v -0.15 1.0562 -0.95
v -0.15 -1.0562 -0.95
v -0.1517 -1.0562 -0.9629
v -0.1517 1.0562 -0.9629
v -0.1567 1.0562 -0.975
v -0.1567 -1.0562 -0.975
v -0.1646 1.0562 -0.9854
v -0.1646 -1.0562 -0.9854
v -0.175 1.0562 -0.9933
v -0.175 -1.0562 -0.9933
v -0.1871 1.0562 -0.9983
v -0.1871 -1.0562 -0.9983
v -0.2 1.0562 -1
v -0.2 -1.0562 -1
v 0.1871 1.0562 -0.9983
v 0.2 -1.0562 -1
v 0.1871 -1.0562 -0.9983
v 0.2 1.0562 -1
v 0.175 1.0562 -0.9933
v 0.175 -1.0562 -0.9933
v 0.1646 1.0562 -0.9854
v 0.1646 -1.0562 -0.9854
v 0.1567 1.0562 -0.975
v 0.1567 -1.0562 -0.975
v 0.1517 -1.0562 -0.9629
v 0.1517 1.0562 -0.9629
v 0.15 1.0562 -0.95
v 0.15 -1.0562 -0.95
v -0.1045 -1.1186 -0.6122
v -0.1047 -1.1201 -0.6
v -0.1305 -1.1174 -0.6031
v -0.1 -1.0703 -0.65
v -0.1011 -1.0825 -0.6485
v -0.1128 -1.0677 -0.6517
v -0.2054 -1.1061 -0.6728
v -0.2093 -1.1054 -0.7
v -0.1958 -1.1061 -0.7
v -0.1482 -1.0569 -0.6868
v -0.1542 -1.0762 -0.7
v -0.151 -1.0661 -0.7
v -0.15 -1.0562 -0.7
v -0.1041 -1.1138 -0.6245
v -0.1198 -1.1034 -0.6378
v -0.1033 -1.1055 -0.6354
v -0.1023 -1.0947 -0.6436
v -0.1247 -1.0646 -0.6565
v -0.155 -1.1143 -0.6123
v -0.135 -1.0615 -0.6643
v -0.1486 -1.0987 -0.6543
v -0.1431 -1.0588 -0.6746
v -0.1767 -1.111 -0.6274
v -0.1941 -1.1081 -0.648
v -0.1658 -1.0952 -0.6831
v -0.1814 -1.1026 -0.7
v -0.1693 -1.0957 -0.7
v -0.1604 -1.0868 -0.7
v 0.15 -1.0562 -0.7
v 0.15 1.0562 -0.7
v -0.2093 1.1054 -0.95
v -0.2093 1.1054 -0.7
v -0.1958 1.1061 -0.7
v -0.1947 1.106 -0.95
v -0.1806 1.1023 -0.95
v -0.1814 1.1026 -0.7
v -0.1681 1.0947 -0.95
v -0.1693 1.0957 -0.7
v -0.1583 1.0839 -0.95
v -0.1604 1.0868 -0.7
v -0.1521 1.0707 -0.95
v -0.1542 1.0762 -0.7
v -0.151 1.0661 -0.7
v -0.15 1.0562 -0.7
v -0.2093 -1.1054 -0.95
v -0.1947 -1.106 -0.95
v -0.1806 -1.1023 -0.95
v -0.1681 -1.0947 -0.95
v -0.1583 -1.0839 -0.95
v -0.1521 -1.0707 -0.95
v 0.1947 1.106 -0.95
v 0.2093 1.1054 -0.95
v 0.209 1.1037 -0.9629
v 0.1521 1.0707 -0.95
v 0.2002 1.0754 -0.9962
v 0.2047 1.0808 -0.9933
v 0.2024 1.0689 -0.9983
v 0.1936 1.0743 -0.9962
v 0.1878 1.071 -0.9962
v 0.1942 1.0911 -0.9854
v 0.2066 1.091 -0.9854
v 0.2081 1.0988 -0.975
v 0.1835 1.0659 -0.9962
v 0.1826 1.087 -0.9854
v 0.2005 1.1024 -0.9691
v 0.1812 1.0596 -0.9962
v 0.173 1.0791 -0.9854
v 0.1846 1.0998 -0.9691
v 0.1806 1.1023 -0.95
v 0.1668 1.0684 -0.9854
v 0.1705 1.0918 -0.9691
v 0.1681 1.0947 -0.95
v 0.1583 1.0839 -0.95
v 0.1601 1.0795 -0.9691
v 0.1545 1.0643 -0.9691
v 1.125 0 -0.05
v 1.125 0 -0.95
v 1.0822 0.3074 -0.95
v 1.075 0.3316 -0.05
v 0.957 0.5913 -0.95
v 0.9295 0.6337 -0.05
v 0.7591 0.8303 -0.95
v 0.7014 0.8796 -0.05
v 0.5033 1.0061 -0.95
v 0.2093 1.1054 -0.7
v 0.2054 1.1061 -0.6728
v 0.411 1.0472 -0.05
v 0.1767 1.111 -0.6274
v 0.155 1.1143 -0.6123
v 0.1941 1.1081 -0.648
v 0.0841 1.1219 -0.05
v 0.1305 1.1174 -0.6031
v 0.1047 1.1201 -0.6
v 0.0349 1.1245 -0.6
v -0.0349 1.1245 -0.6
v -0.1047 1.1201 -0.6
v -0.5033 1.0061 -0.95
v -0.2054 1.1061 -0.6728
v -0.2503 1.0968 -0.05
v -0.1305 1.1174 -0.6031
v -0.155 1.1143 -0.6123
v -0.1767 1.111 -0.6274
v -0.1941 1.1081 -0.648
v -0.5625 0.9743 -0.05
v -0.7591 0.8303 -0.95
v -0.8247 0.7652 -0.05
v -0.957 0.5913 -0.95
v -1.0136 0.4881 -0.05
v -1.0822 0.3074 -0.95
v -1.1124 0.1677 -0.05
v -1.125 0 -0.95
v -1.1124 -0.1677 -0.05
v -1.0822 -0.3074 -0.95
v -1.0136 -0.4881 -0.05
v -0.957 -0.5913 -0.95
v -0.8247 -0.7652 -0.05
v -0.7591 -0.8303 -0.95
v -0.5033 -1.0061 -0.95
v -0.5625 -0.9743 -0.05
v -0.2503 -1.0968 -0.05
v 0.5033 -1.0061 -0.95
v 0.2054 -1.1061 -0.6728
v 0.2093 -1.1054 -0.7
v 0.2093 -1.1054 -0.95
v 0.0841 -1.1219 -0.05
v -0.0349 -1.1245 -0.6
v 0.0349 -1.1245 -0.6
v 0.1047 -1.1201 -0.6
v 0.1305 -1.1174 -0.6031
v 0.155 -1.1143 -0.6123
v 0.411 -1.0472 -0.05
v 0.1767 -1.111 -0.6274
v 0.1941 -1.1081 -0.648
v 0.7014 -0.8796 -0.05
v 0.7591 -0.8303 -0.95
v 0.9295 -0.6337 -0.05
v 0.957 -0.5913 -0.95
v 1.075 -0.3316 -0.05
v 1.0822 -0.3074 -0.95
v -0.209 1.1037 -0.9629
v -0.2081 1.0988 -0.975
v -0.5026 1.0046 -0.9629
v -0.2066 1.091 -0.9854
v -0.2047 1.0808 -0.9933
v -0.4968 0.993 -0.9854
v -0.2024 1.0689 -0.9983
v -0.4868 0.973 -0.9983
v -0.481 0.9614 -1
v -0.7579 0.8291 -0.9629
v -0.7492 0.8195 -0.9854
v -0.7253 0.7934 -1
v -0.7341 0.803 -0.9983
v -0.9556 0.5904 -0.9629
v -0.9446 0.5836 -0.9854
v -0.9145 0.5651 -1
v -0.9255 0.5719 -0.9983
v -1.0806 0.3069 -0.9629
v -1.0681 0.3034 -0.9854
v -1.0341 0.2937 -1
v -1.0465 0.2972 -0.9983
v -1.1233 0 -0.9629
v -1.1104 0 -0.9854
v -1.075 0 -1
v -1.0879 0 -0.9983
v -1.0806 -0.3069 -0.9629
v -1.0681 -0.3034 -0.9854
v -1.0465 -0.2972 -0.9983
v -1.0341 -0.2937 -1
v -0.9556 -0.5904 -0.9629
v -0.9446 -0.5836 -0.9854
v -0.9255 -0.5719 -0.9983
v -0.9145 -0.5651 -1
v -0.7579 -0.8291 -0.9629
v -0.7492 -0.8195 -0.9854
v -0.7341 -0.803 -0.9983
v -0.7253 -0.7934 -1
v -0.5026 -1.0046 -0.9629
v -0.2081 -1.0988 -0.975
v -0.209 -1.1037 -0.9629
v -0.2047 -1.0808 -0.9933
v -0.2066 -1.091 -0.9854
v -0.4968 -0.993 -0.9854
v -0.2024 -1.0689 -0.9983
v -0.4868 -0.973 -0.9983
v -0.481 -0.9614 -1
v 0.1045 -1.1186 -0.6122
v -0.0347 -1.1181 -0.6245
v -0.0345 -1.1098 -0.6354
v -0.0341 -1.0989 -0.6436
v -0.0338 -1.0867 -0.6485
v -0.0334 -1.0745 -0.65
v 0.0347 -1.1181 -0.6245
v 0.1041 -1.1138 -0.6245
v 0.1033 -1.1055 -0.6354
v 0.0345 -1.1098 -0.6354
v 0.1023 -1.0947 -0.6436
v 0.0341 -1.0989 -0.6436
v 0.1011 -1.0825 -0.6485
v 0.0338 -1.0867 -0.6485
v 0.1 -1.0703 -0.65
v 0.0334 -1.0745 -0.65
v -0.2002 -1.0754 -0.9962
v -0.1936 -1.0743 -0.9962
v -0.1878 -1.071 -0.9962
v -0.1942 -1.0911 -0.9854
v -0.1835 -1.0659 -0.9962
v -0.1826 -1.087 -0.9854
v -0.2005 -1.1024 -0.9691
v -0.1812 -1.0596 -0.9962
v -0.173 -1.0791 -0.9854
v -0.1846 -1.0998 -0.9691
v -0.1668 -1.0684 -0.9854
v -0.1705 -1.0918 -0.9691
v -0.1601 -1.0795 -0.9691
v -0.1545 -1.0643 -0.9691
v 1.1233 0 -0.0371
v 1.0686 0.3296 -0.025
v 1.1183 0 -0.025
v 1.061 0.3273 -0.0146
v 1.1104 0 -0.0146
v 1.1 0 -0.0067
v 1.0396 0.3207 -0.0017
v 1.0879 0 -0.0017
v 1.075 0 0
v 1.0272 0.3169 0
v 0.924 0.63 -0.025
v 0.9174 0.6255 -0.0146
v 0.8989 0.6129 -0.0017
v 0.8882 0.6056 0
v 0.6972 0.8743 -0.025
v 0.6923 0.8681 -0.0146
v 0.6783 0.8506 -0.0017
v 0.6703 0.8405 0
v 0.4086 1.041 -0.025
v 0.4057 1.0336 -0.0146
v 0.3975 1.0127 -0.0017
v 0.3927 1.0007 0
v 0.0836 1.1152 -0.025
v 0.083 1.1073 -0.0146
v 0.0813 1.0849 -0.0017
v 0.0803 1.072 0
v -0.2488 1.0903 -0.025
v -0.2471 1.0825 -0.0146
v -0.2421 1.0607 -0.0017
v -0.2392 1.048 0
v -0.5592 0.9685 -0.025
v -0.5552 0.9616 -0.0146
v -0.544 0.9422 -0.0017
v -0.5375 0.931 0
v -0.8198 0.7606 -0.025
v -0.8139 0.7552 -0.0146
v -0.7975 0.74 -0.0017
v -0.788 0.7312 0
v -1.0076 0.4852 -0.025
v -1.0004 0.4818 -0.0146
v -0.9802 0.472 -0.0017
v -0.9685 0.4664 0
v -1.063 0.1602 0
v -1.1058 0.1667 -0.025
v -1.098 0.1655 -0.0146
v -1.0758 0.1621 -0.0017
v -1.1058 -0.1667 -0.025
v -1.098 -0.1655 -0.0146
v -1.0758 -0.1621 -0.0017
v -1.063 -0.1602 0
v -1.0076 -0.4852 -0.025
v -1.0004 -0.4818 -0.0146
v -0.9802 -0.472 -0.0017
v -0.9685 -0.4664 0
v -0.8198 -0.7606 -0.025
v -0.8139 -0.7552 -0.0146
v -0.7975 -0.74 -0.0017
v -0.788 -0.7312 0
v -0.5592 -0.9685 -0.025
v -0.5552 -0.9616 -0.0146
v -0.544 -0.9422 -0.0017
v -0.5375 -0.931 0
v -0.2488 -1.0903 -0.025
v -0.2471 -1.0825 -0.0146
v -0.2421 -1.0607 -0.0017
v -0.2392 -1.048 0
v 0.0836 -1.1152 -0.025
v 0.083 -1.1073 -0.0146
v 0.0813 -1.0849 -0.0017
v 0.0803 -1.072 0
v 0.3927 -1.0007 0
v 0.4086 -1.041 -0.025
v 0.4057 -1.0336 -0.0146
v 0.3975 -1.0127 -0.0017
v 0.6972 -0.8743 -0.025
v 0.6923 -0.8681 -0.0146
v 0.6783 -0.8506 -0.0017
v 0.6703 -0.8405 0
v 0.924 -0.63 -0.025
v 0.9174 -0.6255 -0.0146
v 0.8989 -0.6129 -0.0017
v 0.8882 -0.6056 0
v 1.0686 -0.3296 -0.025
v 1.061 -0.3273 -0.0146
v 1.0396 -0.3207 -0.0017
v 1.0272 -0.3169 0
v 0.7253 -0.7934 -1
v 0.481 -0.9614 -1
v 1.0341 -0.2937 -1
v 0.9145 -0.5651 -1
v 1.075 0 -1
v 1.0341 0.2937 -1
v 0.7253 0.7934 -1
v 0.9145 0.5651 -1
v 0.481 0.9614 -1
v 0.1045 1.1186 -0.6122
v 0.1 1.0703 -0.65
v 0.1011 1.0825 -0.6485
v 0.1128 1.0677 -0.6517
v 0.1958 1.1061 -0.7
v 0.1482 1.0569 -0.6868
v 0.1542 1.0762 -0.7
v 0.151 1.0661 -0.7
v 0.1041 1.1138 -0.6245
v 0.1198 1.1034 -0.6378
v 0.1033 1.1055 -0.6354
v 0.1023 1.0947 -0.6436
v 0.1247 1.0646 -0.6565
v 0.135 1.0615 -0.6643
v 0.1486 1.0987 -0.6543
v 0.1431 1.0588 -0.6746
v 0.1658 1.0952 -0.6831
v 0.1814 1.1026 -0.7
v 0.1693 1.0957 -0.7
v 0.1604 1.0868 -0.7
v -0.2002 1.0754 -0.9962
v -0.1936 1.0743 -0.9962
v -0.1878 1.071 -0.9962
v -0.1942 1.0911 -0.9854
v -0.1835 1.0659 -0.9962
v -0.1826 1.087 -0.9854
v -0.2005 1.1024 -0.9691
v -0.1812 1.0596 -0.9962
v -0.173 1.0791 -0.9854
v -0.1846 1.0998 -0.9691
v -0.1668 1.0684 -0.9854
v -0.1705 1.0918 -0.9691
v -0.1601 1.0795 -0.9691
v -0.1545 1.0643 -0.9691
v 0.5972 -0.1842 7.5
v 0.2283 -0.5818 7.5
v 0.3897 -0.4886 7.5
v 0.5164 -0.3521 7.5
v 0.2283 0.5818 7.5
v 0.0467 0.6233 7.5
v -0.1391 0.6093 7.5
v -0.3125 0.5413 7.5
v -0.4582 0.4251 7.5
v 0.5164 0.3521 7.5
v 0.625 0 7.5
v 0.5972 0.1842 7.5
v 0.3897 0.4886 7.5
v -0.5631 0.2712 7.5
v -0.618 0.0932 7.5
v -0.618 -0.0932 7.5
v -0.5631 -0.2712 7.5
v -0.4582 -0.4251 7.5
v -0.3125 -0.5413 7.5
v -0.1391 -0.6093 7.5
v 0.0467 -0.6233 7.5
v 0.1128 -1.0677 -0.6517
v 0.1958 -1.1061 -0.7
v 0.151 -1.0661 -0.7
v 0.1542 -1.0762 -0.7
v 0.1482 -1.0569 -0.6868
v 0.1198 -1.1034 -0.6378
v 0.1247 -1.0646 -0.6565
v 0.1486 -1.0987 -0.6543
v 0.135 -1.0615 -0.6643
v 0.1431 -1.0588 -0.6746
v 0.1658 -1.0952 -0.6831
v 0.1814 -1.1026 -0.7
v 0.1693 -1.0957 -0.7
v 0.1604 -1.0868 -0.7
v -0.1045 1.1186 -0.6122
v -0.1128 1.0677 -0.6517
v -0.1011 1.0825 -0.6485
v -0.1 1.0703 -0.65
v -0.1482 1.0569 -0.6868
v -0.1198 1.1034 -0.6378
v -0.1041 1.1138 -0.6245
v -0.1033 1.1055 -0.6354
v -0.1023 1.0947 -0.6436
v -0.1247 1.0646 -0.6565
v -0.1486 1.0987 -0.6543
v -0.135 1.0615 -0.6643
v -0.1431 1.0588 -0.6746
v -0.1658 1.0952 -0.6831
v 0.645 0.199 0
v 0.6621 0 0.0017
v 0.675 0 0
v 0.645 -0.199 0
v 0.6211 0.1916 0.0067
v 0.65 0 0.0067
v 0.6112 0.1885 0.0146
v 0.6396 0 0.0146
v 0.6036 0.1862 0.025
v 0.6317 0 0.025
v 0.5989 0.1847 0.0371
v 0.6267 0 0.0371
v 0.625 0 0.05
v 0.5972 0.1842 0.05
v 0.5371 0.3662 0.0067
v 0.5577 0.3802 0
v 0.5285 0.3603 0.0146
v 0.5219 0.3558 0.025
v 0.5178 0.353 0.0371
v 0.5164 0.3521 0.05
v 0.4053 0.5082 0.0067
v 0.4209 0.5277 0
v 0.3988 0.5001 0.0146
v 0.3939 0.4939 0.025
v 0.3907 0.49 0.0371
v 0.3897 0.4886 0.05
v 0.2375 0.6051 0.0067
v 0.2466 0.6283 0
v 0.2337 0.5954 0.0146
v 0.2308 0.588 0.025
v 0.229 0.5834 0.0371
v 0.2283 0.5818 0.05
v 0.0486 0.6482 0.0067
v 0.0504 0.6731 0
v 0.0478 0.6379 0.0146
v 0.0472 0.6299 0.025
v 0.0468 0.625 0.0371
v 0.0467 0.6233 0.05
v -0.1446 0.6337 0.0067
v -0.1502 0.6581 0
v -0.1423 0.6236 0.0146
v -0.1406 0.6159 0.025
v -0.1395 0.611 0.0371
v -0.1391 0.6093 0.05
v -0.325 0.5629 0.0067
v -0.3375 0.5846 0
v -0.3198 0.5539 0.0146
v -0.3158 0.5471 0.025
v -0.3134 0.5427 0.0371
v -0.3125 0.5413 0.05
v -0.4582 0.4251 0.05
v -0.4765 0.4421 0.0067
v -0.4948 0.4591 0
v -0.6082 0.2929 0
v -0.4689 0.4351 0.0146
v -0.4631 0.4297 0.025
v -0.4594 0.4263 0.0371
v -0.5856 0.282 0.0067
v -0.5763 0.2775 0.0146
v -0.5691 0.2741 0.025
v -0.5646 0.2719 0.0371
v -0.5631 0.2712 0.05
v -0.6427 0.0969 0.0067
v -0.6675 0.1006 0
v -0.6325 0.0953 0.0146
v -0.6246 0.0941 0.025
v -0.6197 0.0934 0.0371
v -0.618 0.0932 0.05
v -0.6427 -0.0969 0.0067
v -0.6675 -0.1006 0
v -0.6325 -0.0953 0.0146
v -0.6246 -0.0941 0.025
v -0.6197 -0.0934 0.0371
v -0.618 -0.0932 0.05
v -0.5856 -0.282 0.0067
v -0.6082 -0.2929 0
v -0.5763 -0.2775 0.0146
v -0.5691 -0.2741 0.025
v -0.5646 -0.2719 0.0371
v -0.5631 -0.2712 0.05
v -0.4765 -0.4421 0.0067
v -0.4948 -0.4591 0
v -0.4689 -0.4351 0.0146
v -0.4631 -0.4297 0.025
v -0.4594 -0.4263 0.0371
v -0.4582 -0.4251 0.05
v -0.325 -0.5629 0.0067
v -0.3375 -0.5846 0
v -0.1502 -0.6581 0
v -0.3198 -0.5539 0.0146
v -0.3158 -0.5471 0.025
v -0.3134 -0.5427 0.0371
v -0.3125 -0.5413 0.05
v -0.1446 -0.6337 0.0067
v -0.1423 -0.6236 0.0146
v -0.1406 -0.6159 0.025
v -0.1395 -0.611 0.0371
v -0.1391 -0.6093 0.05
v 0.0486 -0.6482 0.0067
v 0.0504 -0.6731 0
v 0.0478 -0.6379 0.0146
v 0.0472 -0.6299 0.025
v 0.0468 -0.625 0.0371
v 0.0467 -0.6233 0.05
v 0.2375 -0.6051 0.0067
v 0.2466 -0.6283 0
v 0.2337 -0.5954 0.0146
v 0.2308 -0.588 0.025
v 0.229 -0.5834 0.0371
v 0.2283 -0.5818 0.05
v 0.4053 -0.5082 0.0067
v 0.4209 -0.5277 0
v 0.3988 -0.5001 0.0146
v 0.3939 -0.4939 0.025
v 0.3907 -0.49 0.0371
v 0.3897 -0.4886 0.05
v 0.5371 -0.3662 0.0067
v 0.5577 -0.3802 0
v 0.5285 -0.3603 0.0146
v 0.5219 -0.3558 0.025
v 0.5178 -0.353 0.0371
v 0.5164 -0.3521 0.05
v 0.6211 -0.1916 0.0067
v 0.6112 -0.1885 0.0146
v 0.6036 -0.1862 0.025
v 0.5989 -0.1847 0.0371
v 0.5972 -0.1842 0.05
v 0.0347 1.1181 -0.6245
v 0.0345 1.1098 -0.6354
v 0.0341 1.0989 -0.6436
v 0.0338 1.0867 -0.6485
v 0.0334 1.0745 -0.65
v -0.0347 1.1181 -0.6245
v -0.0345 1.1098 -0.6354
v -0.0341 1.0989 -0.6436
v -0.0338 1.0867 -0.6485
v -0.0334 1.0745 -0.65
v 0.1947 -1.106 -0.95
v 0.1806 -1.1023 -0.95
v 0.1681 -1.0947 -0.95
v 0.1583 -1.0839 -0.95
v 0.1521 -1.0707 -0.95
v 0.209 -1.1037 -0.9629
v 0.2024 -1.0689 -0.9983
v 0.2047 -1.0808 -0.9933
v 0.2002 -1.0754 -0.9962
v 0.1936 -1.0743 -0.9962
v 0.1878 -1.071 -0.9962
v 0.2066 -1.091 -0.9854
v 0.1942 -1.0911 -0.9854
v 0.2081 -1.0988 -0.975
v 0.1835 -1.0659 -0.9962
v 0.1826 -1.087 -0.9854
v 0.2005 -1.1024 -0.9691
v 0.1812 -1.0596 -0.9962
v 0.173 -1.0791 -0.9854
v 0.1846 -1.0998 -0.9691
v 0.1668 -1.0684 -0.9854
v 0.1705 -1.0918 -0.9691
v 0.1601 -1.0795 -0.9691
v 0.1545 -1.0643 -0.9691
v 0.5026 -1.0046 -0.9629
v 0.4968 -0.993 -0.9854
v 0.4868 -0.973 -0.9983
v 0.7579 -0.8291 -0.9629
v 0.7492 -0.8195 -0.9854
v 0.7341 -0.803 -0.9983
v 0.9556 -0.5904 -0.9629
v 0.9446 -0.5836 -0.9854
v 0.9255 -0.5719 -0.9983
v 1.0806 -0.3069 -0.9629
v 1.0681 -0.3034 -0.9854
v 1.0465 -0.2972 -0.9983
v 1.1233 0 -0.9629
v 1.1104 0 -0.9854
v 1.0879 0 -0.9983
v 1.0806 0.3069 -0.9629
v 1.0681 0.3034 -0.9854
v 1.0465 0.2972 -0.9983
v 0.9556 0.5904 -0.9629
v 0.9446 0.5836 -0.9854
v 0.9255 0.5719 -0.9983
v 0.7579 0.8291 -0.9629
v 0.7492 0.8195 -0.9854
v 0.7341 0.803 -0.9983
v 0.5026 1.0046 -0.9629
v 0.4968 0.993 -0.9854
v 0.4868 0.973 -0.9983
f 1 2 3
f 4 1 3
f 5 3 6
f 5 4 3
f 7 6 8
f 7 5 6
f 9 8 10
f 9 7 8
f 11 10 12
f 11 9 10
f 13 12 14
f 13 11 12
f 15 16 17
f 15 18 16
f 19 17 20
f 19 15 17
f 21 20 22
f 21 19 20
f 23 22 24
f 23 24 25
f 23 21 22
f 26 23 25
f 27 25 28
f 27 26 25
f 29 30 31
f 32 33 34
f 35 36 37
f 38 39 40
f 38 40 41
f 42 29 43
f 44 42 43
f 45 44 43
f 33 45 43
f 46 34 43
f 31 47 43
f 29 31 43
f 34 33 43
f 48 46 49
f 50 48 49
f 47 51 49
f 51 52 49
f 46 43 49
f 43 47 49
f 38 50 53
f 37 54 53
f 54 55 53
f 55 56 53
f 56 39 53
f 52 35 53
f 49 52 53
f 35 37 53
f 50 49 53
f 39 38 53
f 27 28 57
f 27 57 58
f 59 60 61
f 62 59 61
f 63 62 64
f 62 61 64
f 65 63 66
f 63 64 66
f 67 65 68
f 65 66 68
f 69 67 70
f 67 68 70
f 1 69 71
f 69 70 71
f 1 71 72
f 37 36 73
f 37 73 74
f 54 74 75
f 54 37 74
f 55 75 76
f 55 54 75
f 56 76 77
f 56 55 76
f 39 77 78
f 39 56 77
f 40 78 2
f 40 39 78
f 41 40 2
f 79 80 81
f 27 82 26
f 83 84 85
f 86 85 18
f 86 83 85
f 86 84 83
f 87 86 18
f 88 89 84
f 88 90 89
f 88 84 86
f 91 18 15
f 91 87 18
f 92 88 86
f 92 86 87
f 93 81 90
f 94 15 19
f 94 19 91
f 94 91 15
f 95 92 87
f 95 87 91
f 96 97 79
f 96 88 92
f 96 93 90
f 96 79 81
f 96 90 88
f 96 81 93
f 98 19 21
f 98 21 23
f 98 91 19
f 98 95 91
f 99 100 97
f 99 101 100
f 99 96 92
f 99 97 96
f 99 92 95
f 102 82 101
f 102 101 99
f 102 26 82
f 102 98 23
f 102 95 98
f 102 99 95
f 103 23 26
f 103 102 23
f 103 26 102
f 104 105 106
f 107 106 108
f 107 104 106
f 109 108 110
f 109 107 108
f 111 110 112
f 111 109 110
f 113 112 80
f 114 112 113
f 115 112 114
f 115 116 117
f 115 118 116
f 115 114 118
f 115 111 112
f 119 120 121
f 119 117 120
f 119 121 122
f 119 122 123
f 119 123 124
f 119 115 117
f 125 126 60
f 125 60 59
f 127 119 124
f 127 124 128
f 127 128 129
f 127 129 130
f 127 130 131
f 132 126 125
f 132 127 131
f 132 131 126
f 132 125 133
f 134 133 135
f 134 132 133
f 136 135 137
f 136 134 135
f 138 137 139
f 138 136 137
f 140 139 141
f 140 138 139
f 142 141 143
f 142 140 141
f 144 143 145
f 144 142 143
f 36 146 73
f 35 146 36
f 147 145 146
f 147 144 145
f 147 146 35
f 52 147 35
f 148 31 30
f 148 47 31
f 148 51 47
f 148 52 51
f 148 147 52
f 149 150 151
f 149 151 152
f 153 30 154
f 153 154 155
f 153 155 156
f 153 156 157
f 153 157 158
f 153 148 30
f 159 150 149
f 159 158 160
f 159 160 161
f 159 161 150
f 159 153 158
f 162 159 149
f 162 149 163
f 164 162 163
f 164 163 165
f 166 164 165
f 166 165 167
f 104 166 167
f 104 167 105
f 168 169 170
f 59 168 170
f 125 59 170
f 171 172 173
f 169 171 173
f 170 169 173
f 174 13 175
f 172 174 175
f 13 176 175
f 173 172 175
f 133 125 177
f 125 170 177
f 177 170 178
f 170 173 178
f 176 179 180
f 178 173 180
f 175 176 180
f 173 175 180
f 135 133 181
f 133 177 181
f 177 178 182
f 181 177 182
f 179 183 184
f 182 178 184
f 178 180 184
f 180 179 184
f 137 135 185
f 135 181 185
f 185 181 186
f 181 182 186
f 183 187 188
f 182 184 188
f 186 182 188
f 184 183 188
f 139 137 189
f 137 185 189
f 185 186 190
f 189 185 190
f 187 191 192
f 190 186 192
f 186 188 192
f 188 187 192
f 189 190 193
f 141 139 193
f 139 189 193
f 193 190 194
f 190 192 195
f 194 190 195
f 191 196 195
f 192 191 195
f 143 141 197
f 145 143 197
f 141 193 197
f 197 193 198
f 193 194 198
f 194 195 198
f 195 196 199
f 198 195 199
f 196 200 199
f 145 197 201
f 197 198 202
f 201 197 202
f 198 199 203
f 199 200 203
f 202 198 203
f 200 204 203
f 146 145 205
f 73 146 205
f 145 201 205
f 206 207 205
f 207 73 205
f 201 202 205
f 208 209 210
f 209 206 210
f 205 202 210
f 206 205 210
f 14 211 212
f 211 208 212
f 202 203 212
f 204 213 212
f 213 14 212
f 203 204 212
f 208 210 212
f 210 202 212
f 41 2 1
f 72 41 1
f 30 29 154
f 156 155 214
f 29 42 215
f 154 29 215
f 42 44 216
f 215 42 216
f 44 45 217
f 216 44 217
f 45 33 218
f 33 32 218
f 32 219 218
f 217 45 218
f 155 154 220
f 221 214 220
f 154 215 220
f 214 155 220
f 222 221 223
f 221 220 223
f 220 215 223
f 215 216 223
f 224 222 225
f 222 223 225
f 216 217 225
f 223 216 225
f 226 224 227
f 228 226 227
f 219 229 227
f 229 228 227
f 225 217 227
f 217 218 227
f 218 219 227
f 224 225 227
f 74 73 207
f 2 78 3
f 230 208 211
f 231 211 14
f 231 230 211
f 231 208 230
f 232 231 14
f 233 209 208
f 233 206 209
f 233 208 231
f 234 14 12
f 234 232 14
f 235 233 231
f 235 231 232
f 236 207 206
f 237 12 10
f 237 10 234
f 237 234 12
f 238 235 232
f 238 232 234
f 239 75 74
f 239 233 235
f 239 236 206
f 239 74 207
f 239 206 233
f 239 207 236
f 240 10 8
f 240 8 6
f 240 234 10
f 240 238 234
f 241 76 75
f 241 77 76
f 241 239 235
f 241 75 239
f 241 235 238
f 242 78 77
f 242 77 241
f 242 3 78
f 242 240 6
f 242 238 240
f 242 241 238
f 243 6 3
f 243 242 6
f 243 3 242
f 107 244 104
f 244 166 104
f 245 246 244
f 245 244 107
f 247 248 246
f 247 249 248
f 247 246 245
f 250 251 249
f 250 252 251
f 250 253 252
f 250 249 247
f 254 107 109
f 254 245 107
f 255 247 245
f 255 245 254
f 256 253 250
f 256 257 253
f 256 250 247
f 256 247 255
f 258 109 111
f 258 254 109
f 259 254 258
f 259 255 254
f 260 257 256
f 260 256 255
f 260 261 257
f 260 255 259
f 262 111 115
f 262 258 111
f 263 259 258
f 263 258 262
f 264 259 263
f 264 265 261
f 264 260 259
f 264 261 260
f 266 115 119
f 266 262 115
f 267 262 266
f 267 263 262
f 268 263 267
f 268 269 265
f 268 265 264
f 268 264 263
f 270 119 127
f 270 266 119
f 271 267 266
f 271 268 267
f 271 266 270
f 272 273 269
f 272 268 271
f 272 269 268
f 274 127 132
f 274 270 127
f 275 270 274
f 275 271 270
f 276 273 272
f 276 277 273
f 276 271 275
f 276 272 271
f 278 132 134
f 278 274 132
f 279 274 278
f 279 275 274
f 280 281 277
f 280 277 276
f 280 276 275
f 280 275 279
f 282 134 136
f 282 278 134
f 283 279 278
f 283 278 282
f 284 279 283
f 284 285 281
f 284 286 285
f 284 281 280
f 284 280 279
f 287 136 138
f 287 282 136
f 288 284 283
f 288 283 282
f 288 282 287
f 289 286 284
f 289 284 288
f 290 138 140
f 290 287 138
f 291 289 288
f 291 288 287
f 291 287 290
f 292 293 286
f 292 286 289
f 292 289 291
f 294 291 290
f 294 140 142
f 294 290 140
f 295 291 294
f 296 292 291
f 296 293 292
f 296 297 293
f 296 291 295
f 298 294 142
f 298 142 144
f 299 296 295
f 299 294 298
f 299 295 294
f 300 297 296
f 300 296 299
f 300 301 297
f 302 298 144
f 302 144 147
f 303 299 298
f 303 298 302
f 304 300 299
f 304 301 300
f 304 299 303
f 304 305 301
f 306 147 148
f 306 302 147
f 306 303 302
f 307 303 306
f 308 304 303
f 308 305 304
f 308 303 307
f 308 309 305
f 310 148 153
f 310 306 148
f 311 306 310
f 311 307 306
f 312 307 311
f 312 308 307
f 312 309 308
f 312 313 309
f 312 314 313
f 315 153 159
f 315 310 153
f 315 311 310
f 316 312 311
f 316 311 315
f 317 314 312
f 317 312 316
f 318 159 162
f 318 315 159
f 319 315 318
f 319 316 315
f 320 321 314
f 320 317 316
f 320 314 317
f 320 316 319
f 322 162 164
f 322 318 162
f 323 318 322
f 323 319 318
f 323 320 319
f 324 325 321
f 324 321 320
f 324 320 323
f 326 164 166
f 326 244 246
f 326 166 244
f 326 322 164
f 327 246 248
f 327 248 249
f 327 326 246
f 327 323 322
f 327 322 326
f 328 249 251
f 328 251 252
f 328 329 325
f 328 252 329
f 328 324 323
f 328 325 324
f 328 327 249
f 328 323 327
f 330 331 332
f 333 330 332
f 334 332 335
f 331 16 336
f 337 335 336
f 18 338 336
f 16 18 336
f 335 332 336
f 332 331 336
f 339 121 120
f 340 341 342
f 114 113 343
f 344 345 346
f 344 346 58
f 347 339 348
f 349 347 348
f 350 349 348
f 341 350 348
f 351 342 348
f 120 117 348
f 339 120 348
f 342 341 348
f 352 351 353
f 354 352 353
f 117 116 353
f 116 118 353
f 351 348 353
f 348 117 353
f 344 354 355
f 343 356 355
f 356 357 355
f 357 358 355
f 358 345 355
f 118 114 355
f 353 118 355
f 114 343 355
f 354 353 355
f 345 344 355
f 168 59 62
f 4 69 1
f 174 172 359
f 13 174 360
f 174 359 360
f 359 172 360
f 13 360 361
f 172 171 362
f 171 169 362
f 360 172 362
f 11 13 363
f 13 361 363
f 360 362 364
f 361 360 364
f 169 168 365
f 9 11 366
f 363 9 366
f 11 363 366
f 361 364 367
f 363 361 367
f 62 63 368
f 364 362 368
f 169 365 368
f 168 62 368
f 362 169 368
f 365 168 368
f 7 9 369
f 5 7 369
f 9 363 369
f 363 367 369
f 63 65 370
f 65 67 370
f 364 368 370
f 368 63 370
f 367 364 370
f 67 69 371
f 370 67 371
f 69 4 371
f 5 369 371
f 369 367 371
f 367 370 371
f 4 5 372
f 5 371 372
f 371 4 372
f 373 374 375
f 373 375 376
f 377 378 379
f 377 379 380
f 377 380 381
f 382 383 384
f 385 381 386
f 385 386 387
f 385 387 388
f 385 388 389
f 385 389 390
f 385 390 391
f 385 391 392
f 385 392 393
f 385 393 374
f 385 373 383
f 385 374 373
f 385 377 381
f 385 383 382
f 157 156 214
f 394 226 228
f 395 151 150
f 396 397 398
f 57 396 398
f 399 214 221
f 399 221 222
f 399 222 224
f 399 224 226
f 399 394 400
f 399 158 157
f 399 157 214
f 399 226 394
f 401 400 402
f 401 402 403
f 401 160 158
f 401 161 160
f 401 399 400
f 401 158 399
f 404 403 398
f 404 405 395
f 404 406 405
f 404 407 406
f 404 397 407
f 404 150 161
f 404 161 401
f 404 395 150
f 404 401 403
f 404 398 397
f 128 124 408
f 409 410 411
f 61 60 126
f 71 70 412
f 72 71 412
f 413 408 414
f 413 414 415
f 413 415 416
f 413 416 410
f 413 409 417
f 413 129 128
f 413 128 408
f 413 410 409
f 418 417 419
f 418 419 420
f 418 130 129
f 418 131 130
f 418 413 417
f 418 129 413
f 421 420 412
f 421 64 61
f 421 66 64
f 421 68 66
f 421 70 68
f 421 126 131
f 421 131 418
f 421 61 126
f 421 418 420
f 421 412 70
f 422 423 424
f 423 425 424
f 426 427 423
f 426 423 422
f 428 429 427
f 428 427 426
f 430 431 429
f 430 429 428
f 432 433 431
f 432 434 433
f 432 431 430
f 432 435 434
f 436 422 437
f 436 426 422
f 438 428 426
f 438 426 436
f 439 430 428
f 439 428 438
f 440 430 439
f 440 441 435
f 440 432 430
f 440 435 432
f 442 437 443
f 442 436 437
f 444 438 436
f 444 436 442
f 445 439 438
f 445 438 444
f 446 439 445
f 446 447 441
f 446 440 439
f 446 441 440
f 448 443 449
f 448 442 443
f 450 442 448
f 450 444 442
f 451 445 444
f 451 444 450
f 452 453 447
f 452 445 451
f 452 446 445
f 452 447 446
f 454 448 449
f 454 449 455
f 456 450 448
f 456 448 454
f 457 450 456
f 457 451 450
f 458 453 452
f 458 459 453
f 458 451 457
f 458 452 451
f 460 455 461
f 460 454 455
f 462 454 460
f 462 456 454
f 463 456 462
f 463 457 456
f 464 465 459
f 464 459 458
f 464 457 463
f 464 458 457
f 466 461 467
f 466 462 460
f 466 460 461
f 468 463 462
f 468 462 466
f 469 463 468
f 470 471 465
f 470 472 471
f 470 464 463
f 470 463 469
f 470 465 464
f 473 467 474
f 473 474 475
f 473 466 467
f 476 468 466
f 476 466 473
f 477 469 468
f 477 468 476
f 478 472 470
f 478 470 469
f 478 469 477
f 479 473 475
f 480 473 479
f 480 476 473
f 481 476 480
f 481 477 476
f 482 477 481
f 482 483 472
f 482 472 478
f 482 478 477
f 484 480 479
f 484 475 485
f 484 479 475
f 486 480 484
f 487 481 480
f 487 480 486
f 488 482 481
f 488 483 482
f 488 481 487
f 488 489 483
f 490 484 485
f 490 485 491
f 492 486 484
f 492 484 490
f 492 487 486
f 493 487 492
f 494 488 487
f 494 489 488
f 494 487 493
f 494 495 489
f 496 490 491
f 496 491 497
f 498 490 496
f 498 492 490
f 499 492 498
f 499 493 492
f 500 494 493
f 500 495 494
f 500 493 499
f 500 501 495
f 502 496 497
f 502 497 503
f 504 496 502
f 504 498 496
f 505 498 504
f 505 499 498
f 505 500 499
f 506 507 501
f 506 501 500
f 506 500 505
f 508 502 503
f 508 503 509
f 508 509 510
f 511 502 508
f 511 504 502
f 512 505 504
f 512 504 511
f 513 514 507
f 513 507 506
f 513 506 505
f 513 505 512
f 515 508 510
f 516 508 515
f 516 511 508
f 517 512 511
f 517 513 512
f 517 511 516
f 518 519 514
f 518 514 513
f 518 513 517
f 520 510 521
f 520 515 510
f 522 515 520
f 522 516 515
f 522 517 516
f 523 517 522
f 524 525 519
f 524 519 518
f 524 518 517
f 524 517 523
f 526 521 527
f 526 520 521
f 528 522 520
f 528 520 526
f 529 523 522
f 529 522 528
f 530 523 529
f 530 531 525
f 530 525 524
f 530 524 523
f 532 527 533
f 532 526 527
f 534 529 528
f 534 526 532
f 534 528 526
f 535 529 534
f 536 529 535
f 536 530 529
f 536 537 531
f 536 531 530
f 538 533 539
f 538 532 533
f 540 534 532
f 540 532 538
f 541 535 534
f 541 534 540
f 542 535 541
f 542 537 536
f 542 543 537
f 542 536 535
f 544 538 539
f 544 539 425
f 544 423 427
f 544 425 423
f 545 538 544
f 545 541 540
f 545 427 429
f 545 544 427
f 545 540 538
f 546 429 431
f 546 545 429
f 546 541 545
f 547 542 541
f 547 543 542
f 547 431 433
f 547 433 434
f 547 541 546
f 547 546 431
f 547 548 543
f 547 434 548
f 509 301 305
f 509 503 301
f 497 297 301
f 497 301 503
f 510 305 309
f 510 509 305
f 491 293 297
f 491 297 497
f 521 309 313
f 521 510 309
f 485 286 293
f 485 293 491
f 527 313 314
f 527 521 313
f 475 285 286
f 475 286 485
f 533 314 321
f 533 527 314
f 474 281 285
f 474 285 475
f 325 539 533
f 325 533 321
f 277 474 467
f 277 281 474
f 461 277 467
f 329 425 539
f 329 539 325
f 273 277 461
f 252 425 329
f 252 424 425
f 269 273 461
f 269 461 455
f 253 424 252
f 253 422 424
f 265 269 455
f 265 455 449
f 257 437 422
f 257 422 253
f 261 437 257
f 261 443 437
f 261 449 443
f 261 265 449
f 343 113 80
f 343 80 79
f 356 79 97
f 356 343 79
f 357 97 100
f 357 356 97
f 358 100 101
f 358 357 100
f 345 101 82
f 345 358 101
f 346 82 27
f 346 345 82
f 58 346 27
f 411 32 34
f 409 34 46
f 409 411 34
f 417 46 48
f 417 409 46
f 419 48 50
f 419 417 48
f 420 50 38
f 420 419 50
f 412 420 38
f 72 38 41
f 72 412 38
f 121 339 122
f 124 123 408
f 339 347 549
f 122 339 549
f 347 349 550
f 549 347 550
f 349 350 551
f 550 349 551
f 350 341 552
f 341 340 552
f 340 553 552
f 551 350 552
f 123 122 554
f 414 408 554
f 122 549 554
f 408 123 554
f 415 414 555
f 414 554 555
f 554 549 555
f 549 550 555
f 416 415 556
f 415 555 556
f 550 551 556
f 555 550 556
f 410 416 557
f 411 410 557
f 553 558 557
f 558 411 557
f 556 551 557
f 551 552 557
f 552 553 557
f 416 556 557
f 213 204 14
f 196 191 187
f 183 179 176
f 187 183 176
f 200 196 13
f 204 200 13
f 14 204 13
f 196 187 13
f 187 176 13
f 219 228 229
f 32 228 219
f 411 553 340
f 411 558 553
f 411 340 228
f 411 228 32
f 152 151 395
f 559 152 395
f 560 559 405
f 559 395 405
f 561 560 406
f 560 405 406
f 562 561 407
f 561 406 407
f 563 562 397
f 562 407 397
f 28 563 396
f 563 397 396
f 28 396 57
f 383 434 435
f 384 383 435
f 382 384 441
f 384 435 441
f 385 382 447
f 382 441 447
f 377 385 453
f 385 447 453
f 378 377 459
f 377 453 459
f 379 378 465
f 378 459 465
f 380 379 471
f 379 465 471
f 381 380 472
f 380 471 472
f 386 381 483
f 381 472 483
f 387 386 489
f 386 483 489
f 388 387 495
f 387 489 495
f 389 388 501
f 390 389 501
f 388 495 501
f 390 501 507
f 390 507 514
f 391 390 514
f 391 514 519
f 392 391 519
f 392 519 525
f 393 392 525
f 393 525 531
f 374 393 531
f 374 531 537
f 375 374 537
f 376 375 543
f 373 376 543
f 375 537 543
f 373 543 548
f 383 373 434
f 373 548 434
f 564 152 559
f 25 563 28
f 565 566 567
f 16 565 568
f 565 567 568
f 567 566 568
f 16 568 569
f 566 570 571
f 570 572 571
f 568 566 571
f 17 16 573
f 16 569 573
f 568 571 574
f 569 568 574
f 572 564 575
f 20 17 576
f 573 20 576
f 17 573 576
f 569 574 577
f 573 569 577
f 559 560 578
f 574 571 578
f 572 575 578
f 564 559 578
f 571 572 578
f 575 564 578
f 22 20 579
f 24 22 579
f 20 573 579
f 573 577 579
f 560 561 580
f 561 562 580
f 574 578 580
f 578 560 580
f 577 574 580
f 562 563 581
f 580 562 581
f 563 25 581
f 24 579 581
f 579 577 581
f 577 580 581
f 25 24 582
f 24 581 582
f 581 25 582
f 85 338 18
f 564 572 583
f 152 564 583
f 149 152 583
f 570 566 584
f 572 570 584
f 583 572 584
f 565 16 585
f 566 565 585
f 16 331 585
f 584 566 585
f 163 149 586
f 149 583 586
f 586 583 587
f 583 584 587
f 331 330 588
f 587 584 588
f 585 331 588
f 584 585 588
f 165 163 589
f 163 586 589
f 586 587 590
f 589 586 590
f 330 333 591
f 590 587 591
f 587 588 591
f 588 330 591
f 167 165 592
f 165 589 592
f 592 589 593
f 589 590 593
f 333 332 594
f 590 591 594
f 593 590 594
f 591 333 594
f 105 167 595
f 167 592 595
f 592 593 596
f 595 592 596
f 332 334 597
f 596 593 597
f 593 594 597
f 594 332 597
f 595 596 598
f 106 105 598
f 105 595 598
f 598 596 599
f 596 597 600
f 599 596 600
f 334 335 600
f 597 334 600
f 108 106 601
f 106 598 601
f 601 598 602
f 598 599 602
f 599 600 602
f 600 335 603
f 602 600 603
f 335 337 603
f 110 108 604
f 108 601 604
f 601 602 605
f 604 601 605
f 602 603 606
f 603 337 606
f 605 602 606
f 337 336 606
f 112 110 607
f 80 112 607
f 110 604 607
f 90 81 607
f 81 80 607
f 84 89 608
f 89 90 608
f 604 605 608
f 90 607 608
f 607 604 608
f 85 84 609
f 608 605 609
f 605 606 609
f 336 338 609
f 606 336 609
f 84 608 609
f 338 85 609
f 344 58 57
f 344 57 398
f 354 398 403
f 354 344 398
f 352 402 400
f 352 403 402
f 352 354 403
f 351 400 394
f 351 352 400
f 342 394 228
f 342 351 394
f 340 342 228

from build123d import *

# Parameters (mm, degrees)
SKETCH1_R           = 0.625
BOSS_EXTRUDE1_DEPTH = 7.5
SKETCH2_R           = 1.125
BOSS_EXTRUDE2_DEPTH = 1
SKETCH3_W           = 0.3
SKETCH3_H           = 13.562630166
CUT_EXTRUDE1_DEPTH  = 0.35
FILLET1_R           = 0.05
FILLET2_R           = 0.05


with BuildPart() as part:
    # Sketch1 → Boss-Extrude1 (new body)
    with BuildSketch(Plane.XY):
        Circle(SKETCH1_R)
    extrude(amount=BOSS_EXTRUDE1_DEPTH)

    # Sketch2 → Boss-Extrude2 (add)
    with BuildSketch(Plane.XY):
        Circle(SKETCH2_R)
    extrude(amount=-BOSS_EXTRUDE2_DEPTH)

    # Sketch3 → Cut-Extrude1 (cut)
    with BuildSketch(Plane(origin=(0, 0, -1), x_dir=(-1, 0, 0), z_dir=(0, 0, -1))):
        Rectangle(SKETCH3_W, SKETCH3_H)
    extrude(amount=-CUT_EXTRUDE1_DEPTH, mode=Mode.SUBTRACT)

    # Fillet1
    fillet1_edges = [part.edges().sort_by_distance(p)[0] for p in [
        (0.846869234, -0.740565662, -1),
        (-0.15, 0, -1),
        (0.15, 0, -1),
        (0, 1.125, -0.65),
        (0, -1.125, -0.65),
        (0.15, 1.114955156, -0.825),
        (0.15, -1.114955156, -0.825),
        (-0.15, -1.114955156, -0.825),
        (-0.15, 1.114955156, -0.825),
        (0.15, 0, -0.65),
        (-0.15, 0, -0.65),
        (-1.125, 0, -1),
    ]]
    fillet(fillet1_edges, radius=FILLET1_R)

    # Fillet2
    fillet2_edges = [part.edges().sort_by_distance(p)[0] for p in [
        (-0.625, 0, 0),
        (-1.125, 0, 0),
    ]]
    fillet(fillet2_edges, radius=FILLET2_R)


solid = part.part
